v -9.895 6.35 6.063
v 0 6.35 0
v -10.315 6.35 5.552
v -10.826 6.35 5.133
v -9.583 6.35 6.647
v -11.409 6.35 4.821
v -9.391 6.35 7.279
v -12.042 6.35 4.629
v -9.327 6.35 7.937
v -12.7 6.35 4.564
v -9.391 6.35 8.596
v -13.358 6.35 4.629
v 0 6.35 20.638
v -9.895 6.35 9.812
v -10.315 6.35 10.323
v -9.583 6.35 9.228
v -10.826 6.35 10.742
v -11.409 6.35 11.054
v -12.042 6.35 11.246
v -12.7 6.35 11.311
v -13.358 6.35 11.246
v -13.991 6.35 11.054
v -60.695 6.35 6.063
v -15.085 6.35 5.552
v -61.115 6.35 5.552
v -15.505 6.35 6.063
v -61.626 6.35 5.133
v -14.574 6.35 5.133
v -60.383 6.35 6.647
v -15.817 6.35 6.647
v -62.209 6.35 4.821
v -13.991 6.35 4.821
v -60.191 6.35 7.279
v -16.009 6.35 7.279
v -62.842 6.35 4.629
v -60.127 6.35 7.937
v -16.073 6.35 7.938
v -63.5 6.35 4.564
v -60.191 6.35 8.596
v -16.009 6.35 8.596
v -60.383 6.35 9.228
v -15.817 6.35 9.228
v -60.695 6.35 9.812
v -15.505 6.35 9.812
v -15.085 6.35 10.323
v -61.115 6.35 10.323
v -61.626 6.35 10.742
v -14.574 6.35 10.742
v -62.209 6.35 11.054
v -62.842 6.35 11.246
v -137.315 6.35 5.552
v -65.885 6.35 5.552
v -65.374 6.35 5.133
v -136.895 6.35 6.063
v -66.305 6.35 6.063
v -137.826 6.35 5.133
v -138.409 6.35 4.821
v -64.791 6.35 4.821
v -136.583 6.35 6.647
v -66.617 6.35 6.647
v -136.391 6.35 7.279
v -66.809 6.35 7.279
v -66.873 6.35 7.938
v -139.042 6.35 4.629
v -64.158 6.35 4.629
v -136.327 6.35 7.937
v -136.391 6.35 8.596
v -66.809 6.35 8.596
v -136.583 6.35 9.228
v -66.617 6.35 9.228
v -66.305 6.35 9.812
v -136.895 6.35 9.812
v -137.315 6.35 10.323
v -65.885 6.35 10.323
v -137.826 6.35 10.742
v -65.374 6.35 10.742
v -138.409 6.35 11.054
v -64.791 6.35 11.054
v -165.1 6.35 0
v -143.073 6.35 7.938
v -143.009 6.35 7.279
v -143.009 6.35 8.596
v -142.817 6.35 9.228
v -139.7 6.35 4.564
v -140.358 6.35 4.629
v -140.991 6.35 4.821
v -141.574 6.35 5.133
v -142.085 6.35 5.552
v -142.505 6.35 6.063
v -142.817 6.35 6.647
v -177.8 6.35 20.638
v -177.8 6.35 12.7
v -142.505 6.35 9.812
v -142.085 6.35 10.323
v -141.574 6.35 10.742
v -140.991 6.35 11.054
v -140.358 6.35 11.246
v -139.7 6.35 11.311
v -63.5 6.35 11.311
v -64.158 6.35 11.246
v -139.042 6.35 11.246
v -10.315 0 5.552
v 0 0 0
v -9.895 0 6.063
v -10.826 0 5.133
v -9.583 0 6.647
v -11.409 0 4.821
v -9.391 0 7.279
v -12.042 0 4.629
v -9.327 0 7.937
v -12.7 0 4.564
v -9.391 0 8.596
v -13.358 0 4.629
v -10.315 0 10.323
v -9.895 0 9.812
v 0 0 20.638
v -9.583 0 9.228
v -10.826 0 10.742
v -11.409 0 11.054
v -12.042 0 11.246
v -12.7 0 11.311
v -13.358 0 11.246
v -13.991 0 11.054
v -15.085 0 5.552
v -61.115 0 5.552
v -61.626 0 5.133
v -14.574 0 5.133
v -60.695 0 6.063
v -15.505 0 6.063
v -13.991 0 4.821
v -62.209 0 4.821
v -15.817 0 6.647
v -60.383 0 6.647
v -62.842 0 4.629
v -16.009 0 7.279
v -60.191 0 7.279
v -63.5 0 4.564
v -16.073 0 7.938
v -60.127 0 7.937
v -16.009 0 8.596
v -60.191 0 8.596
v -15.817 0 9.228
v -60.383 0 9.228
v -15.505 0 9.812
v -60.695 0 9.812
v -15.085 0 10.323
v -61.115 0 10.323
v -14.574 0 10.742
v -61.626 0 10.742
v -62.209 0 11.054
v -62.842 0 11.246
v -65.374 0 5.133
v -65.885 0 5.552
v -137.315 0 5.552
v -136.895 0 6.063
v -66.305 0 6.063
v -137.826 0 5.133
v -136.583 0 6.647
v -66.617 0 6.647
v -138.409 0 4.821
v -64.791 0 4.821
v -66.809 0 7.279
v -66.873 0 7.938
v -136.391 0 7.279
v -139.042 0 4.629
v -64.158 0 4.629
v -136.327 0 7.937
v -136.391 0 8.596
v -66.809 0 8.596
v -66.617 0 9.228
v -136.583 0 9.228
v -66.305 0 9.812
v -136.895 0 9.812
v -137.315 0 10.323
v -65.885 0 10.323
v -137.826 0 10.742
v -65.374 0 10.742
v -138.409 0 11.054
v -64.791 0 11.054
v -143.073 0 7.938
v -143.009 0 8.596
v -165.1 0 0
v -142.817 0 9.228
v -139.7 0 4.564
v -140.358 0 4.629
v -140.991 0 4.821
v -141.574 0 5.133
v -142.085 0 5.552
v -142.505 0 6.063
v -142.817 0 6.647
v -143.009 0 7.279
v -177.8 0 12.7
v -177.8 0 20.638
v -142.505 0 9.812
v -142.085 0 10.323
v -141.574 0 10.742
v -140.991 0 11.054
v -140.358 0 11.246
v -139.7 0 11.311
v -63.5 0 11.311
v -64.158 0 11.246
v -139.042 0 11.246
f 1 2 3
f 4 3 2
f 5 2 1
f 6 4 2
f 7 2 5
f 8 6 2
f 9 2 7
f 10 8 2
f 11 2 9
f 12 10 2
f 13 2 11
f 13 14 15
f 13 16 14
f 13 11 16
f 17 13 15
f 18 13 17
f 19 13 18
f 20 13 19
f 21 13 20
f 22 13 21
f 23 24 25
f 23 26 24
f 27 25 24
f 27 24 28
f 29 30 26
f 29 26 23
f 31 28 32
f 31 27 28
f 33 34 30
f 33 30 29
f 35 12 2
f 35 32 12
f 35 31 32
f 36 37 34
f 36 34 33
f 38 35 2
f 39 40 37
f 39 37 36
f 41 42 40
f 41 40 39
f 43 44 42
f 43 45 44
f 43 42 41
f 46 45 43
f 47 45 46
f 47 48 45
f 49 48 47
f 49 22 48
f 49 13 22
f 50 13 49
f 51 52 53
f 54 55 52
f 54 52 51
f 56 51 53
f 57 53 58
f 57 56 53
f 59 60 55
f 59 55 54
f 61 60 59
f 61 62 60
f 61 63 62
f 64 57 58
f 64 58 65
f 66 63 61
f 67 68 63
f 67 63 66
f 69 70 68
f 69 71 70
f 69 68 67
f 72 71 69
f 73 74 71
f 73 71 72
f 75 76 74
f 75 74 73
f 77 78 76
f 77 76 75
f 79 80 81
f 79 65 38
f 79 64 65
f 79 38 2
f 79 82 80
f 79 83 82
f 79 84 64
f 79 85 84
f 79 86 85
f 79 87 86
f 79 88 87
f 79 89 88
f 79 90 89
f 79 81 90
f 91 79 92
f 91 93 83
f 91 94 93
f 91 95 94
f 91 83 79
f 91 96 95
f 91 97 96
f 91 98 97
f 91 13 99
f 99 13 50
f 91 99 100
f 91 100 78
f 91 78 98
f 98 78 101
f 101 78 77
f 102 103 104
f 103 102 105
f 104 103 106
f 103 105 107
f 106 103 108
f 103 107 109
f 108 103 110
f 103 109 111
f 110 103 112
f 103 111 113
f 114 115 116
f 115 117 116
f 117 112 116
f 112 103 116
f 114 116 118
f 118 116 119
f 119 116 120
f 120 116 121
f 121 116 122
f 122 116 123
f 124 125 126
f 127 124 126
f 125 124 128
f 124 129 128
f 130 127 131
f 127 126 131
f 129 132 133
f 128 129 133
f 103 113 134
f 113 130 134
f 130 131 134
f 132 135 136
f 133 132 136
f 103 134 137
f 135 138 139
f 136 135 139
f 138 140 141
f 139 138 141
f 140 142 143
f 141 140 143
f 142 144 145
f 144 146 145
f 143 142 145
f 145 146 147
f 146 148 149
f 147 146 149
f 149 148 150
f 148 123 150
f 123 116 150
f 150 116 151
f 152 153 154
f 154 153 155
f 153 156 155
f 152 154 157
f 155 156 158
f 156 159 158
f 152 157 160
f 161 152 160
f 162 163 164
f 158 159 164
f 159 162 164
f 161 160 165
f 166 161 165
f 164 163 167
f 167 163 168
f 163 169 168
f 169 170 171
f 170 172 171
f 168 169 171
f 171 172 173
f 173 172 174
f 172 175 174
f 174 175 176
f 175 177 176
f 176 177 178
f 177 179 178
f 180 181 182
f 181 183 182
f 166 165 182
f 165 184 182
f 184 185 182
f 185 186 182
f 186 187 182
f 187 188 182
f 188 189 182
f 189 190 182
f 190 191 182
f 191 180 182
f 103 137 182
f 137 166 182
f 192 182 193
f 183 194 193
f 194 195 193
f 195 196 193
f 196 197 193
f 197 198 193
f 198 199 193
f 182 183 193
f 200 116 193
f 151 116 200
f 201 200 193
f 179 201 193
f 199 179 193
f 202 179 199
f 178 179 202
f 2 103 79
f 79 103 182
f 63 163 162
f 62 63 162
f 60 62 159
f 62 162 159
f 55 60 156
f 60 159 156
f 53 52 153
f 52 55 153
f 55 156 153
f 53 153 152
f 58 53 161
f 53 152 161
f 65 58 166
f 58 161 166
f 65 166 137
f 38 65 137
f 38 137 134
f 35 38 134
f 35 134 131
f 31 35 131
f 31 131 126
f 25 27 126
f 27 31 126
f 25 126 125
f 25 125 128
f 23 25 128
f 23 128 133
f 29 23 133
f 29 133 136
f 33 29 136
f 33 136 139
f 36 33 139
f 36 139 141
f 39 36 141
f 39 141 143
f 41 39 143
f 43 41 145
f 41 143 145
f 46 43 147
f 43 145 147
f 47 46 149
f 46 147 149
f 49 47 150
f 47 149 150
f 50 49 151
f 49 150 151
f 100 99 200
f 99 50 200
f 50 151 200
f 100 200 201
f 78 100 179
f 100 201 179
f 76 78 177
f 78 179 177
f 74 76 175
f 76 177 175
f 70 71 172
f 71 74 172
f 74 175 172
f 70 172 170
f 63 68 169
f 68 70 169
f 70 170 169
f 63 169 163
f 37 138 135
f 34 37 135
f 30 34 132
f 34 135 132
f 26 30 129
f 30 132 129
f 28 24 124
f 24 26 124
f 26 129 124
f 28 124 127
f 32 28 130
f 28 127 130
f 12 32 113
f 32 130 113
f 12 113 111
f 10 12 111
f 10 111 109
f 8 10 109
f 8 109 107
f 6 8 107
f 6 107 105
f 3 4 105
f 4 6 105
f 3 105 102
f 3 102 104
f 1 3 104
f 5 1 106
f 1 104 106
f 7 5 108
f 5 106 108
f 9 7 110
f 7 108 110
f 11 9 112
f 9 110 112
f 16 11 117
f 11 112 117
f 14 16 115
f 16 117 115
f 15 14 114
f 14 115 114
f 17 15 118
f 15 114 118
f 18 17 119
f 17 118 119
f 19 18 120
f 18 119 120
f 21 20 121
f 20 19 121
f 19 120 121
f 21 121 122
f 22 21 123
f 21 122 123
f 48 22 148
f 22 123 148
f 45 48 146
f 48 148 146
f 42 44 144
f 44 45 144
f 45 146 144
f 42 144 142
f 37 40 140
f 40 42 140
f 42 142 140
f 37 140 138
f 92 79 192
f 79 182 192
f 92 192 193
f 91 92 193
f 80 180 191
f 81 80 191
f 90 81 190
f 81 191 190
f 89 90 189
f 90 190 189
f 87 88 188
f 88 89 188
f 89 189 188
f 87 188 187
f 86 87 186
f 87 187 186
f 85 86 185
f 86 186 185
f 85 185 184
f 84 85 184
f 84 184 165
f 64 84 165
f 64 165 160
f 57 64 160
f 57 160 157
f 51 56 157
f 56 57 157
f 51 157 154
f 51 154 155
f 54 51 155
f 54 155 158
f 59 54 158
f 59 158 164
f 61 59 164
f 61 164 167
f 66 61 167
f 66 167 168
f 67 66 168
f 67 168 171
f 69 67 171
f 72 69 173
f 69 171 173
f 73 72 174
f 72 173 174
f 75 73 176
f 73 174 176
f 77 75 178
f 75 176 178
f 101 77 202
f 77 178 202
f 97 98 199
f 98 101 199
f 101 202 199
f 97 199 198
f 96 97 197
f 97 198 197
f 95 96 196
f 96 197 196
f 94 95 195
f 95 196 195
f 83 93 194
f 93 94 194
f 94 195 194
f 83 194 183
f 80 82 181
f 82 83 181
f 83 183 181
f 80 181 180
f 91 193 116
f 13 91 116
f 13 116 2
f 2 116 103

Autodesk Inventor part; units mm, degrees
ref_plane "YZ Plane" through (0, 0, 0) normal (1, 0, 0) x (0, 1, 0)
ref_plane "XZ Plane" through (0, 0, 0) normal (0, 1, 0) x (-1, 0, 0)
ref_plane "XY Plane" through (0, 0, 0) normal (0, 0, 1) x (1, 0, 0)
sketch "Sketch1" plane through (0, 0, 0) normal (0, 1, 0) x (-1, 0, 0)
  line L0 (0, 0) -> (165.1, 0)
  line L1 (177.8, 12.7) -> (177.8, 20.6375)
  line L2 (177.8, 20.6375) -> (0, 20.6375)
  line L3 (0, 20.6375) -> (0, 0)
  line L4 (165.1, 0) -> (177.8, 12.7)
  circle A0 centre (139.7, 7.9375) radius 3.3734
  circle A1 centre (63.5, 7.9375) radius 3.3734
  circle A2 centre (12.7, 7.9375) radius 3.3734
  point P0 (177.8, 0)
  dimension "d0" = 177.8
  dimension "d1" = 20.6375
  dimension "d2" = 12.7
  dimension "d3" = 12.7
  dimension "d4" = 12.7
  dimension "d5" = 12.7
  dimension "d6" = 12.7
  dimension "d7" = 12.7
  dimension "d8" = 63.5
  dimension "d9" = 139.7
  dimension "d10" = 6.7469
  dimension "d11" = 6.7469
  dimension "d12" = 6.7469
extrude "Extrusion1" add sketch "Sketch1" along normal blind 6.35
equation "\"d3\" = d2"
properties part number "gusset guard" material "Aluminum 6061"
